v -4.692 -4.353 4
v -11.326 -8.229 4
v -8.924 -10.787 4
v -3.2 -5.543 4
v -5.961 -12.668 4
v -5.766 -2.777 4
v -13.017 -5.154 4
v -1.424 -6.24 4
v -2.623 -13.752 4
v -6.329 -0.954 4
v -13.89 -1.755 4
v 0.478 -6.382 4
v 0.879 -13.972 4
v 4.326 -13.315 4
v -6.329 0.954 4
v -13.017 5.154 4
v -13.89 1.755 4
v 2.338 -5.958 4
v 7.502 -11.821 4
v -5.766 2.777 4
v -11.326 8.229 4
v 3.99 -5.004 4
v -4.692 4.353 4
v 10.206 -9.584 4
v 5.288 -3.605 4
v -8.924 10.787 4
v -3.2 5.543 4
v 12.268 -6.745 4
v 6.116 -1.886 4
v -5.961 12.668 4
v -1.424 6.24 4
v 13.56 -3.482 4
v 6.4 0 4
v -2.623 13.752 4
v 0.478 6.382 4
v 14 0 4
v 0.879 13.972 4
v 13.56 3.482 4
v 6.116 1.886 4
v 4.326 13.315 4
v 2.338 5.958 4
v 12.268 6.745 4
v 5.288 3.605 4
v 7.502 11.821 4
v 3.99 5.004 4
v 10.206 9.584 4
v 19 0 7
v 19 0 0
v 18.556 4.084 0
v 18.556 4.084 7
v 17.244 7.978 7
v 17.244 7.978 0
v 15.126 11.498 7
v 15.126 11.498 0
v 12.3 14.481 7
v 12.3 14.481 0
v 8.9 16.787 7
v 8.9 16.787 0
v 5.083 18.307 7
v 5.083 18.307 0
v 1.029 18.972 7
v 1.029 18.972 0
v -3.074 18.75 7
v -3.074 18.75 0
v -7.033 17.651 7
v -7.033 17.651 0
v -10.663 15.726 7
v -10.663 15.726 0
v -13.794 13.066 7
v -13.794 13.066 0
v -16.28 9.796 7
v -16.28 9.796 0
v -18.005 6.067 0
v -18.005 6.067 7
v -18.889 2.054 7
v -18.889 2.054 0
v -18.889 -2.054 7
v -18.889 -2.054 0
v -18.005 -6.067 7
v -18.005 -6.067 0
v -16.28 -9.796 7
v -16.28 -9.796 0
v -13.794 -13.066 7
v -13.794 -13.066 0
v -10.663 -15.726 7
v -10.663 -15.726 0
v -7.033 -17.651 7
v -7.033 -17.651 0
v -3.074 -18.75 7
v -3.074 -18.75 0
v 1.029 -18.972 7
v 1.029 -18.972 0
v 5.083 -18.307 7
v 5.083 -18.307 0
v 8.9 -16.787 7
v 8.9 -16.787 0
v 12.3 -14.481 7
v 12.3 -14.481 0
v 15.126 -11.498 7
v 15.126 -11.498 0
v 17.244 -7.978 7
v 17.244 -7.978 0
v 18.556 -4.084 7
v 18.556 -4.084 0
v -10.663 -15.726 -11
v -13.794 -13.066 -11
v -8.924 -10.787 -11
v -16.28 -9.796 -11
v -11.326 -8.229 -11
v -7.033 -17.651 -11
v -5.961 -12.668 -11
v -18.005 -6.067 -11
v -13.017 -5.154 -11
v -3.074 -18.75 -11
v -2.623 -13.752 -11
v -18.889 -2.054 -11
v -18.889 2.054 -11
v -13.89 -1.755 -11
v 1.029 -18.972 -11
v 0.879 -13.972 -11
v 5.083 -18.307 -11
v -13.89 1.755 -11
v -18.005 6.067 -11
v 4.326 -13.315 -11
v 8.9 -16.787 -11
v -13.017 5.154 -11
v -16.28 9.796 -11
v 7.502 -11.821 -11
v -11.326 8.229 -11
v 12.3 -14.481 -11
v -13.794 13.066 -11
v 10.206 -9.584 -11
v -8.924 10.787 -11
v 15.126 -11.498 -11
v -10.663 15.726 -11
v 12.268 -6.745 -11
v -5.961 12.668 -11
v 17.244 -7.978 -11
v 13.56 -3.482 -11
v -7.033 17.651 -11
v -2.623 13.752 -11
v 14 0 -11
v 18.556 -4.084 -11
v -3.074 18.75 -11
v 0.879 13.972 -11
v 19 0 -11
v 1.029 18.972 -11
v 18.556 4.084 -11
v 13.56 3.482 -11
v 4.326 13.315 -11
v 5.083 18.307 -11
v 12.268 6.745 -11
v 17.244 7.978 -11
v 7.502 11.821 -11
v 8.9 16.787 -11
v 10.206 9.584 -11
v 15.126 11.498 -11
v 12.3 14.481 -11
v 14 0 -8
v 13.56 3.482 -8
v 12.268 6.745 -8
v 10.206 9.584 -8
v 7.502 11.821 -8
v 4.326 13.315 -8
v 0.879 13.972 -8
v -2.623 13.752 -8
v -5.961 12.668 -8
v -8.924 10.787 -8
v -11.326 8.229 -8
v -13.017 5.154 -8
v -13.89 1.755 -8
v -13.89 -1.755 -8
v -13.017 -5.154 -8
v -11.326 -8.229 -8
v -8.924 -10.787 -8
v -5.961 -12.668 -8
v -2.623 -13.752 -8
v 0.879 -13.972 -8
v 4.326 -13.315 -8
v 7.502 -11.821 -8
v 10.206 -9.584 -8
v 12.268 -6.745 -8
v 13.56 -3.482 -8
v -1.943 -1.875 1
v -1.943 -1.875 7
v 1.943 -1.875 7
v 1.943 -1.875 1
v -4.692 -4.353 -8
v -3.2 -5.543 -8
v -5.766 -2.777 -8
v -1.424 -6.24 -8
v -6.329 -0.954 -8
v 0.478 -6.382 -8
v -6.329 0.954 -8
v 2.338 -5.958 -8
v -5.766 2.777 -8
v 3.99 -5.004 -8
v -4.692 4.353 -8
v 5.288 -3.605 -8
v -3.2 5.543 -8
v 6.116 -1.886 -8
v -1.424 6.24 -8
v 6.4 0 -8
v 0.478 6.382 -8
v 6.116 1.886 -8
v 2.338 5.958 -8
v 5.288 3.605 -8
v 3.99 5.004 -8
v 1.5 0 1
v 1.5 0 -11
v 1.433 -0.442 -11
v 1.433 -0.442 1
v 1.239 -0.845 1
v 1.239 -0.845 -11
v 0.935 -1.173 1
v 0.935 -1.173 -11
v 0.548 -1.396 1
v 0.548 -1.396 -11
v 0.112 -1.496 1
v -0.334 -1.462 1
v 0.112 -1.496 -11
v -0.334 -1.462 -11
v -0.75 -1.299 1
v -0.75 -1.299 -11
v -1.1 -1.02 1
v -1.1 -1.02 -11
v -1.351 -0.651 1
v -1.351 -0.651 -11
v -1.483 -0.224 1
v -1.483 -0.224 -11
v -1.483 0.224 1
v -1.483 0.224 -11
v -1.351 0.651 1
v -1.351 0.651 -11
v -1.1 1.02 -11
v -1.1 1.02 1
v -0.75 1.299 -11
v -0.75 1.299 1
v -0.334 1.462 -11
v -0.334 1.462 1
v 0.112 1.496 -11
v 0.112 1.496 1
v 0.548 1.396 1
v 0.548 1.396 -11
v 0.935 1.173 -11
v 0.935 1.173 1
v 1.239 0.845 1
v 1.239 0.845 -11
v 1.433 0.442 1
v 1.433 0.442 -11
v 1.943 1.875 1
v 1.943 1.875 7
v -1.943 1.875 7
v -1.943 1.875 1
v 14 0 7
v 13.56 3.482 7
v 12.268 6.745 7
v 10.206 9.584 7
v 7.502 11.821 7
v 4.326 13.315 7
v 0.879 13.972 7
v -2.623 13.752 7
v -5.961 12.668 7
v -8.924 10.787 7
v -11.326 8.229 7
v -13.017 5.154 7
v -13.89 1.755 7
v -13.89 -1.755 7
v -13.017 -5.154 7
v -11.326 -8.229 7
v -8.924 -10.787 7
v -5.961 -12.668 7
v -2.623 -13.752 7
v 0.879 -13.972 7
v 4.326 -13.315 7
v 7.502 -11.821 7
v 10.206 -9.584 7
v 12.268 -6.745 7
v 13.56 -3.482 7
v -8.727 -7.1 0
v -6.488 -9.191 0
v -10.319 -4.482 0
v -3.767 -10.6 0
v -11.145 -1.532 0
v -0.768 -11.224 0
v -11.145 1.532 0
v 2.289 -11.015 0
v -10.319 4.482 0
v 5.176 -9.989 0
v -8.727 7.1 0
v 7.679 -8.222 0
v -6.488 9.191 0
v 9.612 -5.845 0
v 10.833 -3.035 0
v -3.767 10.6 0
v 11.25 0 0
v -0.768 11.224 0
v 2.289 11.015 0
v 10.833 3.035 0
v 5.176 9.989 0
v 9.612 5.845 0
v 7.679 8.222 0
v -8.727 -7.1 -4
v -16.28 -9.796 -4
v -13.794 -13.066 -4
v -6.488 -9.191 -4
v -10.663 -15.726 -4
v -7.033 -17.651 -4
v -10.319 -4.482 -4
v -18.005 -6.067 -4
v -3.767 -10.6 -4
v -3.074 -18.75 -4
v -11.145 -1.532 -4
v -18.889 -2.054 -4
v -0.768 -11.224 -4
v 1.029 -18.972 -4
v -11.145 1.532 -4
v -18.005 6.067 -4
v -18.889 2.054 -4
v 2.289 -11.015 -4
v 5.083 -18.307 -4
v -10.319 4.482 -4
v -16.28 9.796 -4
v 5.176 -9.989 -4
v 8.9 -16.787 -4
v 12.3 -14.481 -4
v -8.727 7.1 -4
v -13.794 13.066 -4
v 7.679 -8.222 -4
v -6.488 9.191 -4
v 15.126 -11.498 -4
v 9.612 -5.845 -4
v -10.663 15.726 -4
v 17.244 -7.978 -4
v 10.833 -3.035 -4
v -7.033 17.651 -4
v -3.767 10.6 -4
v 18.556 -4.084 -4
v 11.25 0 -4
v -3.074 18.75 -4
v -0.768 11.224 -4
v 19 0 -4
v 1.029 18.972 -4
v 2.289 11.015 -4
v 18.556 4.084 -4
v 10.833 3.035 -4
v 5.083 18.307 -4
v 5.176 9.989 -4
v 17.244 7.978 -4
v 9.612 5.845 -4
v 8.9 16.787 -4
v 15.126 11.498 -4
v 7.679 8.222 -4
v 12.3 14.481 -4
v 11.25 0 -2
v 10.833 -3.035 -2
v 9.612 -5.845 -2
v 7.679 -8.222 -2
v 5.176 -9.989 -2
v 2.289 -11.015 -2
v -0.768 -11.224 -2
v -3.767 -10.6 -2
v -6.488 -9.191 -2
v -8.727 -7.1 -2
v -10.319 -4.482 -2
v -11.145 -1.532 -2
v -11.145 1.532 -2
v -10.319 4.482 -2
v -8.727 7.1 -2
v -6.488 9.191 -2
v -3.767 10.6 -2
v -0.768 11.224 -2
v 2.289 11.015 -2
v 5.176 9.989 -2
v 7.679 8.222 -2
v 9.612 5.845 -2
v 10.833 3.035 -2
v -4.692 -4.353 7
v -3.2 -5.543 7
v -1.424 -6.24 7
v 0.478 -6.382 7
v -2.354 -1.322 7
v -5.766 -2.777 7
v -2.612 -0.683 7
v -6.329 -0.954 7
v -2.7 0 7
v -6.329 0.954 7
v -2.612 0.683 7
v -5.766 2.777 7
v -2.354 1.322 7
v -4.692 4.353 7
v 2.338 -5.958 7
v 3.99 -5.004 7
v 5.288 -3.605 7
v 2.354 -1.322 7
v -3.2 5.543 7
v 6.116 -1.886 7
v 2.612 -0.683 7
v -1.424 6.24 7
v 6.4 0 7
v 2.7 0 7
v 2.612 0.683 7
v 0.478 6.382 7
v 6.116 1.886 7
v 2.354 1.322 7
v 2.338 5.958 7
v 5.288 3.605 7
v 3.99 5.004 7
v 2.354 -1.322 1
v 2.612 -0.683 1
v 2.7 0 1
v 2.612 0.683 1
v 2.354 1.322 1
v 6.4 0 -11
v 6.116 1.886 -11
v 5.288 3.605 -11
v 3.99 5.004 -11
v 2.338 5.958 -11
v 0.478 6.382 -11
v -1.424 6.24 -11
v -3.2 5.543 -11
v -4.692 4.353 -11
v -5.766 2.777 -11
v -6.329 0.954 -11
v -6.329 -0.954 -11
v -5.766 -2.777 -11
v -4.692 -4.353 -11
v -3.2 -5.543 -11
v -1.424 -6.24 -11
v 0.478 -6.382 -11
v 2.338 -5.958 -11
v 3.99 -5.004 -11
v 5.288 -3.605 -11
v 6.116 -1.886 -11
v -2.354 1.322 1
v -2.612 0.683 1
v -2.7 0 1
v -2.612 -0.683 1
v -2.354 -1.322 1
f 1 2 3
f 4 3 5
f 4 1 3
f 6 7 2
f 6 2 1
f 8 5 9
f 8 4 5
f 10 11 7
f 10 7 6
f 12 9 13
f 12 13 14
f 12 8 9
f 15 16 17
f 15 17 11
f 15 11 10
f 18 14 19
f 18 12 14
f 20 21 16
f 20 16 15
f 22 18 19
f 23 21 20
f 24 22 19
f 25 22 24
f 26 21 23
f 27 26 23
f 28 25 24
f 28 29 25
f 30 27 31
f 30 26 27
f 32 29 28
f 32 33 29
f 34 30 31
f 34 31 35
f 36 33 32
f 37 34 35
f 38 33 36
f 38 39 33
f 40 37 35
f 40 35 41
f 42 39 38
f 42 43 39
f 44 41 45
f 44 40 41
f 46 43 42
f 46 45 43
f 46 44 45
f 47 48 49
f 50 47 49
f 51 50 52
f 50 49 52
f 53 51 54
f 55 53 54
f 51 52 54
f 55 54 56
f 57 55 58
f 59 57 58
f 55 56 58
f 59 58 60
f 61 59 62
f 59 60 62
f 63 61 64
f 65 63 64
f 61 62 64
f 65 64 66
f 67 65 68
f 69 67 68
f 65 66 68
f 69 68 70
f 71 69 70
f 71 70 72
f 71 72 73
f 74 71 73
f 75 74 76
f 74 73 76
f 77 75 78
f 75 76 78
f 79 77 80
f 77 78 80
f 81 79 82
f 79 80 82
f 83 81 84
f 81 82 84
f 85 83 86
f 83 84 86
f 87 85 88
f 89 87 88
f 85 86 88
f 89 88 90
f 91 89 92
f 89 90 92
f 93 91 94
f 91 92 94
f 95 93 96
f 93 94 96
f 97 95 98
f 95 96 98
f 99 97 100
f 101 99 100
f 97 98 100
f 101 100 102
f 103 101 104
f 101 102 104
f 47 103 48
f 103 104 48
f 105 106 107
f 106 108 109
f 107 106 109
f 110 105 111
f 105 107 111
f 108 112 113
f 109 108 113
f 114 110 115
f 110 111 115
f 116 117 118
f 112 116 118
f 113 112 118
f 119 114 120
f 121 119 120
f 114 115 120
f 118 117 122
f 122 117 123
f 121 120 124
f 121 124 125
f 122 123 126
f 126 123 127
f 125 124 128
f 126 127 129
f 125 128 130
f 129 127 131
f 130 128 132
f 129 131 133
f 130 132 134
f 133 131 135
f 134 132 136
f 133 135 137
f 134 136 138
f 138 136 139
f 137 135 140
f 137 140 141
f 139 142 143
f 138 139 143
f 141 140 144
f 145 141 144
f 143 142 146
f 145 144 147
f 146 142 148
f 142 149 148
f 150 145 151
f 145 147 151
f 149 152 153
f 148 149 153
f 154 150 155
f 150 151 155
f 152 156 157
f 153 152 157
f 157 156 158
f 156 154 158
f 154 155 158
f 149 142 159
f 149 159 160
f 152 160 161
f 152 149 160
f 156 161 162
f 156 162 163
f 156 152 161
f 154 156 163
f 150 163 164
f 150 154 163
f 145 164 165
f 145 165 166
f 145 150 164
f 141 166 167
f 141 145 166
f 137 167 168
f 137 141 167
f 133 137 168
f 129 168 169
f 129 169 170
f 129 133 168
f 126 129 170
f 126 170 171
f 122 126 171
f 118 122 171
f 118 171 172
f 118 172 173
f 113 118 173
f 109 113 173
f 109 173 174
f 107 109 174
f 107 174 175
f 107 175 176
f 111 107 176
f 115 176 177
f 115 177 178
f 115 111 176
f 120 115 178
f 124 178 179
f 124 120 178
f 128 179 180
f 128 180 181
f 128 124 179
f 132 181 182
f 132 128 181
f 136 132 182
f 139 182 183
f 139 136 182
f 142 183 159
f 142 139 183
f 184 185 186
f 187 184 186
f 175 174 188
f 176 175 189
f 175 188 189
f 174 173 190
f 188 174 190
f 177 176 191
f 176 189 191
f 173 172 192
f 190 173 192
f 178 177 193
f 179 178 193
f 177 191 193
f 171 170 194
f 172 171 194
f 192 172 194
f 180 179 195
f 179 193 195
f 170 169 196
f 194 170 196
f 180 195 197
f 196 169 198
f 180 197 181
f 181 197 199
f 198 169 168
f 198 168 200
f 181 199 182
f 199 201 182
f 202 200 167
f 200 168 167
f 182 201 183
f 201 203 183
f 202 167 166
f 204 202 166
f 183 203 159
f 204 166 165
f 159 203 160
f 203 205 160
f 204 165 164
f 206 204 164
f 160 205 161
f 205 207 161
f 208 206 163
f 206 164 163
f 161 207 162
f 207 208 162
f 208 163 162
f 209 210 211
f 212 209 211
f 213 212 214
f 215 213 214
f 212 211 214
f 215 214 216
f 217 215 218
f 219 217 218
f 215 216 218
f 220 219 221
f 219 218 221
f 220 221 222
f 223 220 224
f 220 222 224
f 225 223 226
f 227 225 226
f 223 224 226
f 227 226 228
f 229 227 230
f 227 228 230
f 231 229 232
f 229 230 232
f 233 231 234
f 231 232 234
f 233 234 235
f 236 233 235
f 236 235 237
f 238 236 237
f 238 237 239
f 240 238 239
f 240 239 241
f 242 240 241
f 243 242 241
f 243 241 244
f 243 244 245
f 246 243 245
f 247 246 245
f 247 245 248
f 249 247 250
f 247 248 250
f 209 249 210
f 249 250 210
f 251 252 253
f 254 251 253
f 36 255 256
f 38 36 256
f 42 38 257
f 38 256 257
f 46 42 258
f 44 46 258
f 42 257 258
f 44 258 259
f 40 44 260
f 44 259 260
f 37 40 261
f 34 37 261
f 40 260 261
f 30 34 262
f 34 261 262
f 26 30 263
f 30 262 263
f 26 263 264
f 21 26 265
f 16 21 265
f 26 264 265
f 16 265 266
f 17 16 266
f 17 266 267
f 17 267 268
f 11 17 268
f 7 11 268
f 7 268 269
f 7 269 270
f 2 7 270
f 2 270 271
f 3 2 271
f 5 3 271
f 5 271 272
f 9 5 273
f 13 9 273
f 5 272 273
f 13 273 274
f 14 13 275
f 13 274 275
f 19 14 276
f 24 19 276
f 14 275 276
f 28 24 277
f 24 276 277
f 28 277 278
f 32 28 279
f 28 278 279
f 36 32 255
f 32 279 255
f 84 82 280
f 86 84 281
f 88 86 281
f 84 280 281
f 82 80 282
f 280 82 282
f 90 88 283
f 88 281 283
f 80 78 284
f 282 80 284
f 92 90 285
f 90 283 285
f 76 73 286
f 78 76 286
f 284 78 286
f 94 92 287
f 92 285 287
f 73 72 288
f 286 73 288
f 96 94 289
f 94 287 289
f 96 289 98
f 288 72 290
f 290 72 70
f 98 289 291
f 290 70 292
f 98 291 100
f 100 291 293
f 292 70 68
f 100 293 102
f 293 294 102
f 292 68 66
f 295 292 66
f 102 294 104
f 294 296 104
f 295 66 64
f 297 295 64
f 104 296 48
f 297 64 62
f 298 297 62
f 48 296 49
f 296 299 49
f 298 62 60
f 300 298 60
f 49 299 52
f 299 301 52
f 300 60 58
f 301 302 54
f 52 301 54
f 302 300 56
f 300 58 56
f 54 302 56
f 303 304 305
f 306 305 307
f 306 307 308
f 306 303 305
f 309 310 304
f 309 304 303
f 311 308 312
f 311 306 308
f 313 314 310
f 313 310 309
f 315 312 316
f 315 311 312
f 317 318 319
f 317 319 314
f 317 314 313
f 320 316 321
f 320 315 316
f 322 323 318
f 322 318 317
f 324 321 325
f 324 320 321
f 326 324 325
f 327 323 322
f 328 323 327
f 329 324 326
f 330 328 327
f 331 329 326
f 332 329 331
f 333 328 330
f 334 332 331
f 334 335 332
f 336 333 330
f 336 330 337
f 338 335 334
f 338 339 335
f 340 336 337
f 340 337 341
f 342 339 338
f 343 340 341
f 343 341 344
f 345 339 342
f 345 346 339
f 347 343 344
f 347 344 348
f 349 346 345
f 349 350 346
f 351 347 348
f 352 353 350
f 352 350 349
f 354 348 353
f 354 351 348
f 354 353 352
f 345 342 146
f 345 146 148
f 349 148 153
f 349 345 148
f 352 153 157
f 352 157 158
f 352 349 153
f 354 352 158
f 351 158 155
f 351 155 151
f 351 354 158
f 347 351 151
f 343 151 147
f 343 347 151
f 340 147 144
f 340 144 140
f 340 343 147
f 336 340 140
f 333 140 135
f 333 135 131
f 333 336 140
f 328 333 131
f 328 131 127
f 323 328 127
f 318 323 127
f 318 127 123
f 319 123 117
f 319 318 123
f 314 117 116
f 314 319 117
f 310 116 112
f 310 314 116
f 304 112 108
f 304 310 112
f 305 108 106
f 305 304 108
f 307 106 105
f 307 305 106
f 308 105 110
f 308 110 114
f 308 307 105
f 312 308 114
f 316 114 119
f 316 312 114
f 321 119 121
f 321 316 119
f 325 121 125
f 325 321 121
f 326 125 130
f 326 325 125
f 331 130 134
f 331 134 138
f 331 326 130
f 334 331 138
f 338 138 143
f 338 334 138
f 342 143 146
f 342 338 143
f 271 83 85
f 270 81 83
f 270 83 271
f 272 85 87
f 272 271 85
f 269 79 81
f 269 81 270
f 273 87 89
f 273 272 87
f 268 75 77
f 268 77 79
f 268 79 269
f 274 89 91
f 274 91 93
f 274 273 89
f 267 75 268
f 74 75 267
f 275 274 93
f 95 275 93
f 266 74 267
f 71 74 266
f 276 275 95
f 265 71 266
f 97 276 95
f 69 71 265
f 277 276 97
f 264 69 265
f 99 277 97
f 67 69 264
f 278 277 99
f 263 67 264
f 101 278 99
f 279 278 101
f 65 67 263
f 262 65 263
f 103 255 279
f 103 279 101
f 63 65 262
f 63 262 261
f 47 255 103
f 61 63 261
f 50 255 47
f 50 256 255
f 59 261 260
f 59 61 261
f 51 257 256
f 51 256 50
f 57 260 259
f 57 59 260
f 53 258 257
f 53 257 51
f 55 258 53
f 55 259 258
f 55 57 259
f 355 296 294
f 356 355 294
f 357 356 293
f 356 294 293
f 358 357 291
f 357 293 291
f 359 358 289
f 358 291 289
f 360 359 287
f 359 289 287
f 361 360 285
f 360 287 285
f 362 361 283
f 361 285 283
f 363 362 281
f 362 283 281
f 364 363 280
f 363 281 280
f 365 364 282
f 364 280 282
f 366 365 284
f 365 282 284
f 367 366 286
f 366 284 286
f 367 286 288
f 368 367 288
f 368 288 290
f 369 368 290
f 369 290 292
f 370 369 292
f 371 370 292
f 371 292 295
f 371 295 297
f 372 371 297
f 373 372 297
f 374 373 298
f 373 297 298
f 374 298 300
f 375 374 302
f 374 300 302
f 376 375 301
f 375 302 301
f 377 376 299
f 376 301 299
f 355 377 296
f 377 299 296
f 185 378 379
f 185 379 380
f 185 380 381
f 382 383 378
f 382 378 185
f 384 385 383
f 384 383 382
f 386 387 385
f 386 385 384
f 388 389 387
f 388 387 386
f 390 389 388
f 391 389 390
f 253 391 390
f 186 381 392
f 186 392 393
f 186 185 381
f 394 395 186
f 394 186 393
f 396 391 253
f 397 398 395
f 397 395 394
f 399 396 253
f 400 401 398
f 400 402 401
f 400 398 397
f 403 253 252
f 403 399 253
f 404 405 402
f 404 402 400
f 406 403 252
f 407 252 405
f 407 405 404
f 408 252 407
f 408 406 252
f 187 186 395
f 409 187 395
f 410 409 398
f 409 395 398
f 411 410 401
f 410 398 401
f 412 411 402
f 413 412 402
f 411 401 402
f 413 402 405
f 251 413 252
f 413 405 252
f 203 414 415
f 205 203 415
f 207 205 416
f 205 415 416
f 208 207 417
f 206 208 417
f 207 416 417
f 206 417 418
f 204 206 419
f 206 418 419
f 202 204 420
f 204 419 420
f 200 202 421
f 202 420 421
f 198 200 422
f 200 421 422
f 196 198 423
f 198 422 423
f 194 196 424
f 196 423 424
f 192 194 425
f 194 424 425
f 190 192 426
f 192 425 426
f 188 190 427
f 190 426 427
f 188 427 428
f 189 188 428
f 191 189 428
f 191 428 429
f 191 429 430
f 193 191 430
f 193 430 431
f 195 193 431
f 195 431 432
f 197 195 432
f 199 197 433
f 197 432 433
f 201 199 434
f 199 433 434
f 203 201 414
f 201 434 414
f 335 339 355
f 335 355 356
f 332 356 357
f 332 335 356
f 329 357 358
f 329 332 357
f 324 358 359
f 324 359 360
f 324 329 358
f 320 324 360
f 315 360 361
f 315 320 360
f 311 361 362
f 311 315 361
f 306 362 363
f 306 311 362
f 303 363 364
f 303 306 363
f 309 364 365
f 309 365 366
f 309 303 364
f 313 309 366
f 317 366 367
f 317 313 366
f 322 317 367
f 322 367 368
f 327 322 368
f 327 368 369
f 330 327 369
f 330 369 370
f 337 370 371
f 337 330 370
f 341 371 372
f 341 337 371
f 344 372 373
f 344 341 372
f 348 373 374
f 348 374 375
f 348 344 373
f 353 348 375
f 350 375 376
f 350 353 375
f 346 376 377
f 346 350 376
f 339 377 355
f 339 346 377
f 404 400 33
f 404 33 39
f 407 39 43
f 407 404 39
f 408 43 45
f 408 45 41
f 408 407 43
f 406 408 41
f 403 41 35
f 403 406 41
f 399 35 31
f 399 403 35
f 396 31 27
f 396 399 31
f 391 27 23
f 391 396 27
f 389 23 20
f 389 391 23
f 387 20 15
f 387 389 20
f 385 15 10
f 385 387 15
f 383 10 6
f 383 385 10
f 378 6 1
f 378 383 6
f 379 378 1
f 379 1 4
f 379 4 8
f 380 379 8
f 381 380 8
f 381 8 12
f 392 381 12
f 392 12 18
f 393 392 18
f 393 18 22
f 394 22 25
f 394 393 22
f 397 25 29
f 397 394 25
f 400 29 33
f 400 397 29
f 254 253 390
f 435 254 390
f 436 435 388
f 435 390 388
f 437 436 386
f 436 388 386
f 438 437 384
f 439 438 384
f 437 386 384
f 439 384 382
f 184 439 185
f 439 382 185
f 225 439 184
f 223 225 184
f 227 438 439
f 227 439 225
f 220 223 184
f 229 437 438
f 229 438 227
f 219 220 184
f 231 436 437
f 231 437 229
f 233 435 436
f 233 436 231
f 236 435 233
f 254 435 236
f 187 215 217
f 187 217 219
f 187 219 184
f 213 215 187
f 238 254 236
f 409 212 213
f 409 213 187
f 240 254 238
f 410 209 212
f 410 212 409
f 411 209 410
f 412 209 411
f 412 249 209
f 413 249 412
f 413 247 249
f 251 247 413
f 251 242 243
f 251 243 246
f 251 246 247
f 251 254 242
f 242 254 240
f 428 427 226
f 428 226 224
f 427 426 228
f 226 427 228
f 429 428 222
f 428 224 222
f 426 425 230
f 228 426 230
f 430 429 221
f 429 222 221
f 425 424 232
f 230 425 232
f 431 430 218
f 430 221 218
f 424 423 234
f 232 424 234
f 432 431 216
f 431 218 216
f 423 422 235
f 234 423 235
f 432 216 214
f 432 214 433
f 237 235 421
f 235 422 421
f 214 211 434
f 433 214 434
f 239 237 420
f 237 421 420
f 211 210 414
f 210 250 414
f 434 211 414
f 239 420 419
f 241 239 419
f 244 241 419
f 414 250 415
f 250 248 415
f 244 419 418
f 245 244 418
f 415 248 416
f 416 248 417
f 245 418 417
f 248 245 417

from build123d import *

# Parameters (mm, degrees)
F0_R      = 19
F1_DEPTH  = 7
F2_R      = 11.25
F3_DEPTH  = 2
F4_R      = 14
F4_R_2    = 6.4
F5_DEPTH  = 3
F8_DEPTH  = 6
F9_R      = 1.5
F10_DEPTH = 12


# Not quite as in the source:
# - a feature names something its author has since deleted; it is built from what else it names


with BuildPart() as f1:
    # F0 (on Top) → F1 (new body)
    with BuildSketch(Plane.XY):
        Circle(F0_R)
    extrude(amount=F1_DEPTH)

    # F2 (on face) → F3 (join)
    with BuildSketch(Plane(origin=(0, 0, 0), x_dir=(1, 0, 0), z_dir=(0, 0, -1))):
        Circle(F2_R)
    extrude(amount=F3_DEPTH)

    # F4 (on face) → F5 (cut)
    with BuildSketch(Plane.XY.offset(7)):
        Circle(F4_R)
        Circle(F4_R_2, mode=Mode.SUBTRACT)
    extrude(amount=-F5_DEPTH, mode=Mode.SUBTRACT)

    # F6: F1 across face


with BuildPart() as f1_1:
    add(f1.part)
    add(f1.part.mirror(Plane(origin=(0, 0, -2), x_dir=(1, 0, 0), z_dir=(0, 0, -1))))

    # F7 (on face) → F8 (cut)
    with BuildSketch(Plane.XY.offset(7)):
        with BuildLine():
            Line((1.942775077, 1.875), (-1.942775077, 1.875))
            ThreePointArc((-1.942775077, 1.875), (-2.7, 0), (-1.942775077, -1.875))
            Line((-1.942775077, -1.875), (1.942775077, -1.875))
            ThreePointArc((1.942775077, -1.875), (2.7, 0), (1.942775077, 1.875))
        make_face()
    extrude(amount=-F8_DEPTH, mode=Mode.SUBTRACT)

    # F9 (on face) → F10 (cut, through all)
    with BuildSketch(Plane(origin=(0, 0, -11), x_dir=(1, 0, 0), z_dir=(0, 0, -1))):
        Circle(F9_R)
    extrude(amount=-F10_DEPTH, mode=Mode.SUBTRACT)


solid = f1_1.part
